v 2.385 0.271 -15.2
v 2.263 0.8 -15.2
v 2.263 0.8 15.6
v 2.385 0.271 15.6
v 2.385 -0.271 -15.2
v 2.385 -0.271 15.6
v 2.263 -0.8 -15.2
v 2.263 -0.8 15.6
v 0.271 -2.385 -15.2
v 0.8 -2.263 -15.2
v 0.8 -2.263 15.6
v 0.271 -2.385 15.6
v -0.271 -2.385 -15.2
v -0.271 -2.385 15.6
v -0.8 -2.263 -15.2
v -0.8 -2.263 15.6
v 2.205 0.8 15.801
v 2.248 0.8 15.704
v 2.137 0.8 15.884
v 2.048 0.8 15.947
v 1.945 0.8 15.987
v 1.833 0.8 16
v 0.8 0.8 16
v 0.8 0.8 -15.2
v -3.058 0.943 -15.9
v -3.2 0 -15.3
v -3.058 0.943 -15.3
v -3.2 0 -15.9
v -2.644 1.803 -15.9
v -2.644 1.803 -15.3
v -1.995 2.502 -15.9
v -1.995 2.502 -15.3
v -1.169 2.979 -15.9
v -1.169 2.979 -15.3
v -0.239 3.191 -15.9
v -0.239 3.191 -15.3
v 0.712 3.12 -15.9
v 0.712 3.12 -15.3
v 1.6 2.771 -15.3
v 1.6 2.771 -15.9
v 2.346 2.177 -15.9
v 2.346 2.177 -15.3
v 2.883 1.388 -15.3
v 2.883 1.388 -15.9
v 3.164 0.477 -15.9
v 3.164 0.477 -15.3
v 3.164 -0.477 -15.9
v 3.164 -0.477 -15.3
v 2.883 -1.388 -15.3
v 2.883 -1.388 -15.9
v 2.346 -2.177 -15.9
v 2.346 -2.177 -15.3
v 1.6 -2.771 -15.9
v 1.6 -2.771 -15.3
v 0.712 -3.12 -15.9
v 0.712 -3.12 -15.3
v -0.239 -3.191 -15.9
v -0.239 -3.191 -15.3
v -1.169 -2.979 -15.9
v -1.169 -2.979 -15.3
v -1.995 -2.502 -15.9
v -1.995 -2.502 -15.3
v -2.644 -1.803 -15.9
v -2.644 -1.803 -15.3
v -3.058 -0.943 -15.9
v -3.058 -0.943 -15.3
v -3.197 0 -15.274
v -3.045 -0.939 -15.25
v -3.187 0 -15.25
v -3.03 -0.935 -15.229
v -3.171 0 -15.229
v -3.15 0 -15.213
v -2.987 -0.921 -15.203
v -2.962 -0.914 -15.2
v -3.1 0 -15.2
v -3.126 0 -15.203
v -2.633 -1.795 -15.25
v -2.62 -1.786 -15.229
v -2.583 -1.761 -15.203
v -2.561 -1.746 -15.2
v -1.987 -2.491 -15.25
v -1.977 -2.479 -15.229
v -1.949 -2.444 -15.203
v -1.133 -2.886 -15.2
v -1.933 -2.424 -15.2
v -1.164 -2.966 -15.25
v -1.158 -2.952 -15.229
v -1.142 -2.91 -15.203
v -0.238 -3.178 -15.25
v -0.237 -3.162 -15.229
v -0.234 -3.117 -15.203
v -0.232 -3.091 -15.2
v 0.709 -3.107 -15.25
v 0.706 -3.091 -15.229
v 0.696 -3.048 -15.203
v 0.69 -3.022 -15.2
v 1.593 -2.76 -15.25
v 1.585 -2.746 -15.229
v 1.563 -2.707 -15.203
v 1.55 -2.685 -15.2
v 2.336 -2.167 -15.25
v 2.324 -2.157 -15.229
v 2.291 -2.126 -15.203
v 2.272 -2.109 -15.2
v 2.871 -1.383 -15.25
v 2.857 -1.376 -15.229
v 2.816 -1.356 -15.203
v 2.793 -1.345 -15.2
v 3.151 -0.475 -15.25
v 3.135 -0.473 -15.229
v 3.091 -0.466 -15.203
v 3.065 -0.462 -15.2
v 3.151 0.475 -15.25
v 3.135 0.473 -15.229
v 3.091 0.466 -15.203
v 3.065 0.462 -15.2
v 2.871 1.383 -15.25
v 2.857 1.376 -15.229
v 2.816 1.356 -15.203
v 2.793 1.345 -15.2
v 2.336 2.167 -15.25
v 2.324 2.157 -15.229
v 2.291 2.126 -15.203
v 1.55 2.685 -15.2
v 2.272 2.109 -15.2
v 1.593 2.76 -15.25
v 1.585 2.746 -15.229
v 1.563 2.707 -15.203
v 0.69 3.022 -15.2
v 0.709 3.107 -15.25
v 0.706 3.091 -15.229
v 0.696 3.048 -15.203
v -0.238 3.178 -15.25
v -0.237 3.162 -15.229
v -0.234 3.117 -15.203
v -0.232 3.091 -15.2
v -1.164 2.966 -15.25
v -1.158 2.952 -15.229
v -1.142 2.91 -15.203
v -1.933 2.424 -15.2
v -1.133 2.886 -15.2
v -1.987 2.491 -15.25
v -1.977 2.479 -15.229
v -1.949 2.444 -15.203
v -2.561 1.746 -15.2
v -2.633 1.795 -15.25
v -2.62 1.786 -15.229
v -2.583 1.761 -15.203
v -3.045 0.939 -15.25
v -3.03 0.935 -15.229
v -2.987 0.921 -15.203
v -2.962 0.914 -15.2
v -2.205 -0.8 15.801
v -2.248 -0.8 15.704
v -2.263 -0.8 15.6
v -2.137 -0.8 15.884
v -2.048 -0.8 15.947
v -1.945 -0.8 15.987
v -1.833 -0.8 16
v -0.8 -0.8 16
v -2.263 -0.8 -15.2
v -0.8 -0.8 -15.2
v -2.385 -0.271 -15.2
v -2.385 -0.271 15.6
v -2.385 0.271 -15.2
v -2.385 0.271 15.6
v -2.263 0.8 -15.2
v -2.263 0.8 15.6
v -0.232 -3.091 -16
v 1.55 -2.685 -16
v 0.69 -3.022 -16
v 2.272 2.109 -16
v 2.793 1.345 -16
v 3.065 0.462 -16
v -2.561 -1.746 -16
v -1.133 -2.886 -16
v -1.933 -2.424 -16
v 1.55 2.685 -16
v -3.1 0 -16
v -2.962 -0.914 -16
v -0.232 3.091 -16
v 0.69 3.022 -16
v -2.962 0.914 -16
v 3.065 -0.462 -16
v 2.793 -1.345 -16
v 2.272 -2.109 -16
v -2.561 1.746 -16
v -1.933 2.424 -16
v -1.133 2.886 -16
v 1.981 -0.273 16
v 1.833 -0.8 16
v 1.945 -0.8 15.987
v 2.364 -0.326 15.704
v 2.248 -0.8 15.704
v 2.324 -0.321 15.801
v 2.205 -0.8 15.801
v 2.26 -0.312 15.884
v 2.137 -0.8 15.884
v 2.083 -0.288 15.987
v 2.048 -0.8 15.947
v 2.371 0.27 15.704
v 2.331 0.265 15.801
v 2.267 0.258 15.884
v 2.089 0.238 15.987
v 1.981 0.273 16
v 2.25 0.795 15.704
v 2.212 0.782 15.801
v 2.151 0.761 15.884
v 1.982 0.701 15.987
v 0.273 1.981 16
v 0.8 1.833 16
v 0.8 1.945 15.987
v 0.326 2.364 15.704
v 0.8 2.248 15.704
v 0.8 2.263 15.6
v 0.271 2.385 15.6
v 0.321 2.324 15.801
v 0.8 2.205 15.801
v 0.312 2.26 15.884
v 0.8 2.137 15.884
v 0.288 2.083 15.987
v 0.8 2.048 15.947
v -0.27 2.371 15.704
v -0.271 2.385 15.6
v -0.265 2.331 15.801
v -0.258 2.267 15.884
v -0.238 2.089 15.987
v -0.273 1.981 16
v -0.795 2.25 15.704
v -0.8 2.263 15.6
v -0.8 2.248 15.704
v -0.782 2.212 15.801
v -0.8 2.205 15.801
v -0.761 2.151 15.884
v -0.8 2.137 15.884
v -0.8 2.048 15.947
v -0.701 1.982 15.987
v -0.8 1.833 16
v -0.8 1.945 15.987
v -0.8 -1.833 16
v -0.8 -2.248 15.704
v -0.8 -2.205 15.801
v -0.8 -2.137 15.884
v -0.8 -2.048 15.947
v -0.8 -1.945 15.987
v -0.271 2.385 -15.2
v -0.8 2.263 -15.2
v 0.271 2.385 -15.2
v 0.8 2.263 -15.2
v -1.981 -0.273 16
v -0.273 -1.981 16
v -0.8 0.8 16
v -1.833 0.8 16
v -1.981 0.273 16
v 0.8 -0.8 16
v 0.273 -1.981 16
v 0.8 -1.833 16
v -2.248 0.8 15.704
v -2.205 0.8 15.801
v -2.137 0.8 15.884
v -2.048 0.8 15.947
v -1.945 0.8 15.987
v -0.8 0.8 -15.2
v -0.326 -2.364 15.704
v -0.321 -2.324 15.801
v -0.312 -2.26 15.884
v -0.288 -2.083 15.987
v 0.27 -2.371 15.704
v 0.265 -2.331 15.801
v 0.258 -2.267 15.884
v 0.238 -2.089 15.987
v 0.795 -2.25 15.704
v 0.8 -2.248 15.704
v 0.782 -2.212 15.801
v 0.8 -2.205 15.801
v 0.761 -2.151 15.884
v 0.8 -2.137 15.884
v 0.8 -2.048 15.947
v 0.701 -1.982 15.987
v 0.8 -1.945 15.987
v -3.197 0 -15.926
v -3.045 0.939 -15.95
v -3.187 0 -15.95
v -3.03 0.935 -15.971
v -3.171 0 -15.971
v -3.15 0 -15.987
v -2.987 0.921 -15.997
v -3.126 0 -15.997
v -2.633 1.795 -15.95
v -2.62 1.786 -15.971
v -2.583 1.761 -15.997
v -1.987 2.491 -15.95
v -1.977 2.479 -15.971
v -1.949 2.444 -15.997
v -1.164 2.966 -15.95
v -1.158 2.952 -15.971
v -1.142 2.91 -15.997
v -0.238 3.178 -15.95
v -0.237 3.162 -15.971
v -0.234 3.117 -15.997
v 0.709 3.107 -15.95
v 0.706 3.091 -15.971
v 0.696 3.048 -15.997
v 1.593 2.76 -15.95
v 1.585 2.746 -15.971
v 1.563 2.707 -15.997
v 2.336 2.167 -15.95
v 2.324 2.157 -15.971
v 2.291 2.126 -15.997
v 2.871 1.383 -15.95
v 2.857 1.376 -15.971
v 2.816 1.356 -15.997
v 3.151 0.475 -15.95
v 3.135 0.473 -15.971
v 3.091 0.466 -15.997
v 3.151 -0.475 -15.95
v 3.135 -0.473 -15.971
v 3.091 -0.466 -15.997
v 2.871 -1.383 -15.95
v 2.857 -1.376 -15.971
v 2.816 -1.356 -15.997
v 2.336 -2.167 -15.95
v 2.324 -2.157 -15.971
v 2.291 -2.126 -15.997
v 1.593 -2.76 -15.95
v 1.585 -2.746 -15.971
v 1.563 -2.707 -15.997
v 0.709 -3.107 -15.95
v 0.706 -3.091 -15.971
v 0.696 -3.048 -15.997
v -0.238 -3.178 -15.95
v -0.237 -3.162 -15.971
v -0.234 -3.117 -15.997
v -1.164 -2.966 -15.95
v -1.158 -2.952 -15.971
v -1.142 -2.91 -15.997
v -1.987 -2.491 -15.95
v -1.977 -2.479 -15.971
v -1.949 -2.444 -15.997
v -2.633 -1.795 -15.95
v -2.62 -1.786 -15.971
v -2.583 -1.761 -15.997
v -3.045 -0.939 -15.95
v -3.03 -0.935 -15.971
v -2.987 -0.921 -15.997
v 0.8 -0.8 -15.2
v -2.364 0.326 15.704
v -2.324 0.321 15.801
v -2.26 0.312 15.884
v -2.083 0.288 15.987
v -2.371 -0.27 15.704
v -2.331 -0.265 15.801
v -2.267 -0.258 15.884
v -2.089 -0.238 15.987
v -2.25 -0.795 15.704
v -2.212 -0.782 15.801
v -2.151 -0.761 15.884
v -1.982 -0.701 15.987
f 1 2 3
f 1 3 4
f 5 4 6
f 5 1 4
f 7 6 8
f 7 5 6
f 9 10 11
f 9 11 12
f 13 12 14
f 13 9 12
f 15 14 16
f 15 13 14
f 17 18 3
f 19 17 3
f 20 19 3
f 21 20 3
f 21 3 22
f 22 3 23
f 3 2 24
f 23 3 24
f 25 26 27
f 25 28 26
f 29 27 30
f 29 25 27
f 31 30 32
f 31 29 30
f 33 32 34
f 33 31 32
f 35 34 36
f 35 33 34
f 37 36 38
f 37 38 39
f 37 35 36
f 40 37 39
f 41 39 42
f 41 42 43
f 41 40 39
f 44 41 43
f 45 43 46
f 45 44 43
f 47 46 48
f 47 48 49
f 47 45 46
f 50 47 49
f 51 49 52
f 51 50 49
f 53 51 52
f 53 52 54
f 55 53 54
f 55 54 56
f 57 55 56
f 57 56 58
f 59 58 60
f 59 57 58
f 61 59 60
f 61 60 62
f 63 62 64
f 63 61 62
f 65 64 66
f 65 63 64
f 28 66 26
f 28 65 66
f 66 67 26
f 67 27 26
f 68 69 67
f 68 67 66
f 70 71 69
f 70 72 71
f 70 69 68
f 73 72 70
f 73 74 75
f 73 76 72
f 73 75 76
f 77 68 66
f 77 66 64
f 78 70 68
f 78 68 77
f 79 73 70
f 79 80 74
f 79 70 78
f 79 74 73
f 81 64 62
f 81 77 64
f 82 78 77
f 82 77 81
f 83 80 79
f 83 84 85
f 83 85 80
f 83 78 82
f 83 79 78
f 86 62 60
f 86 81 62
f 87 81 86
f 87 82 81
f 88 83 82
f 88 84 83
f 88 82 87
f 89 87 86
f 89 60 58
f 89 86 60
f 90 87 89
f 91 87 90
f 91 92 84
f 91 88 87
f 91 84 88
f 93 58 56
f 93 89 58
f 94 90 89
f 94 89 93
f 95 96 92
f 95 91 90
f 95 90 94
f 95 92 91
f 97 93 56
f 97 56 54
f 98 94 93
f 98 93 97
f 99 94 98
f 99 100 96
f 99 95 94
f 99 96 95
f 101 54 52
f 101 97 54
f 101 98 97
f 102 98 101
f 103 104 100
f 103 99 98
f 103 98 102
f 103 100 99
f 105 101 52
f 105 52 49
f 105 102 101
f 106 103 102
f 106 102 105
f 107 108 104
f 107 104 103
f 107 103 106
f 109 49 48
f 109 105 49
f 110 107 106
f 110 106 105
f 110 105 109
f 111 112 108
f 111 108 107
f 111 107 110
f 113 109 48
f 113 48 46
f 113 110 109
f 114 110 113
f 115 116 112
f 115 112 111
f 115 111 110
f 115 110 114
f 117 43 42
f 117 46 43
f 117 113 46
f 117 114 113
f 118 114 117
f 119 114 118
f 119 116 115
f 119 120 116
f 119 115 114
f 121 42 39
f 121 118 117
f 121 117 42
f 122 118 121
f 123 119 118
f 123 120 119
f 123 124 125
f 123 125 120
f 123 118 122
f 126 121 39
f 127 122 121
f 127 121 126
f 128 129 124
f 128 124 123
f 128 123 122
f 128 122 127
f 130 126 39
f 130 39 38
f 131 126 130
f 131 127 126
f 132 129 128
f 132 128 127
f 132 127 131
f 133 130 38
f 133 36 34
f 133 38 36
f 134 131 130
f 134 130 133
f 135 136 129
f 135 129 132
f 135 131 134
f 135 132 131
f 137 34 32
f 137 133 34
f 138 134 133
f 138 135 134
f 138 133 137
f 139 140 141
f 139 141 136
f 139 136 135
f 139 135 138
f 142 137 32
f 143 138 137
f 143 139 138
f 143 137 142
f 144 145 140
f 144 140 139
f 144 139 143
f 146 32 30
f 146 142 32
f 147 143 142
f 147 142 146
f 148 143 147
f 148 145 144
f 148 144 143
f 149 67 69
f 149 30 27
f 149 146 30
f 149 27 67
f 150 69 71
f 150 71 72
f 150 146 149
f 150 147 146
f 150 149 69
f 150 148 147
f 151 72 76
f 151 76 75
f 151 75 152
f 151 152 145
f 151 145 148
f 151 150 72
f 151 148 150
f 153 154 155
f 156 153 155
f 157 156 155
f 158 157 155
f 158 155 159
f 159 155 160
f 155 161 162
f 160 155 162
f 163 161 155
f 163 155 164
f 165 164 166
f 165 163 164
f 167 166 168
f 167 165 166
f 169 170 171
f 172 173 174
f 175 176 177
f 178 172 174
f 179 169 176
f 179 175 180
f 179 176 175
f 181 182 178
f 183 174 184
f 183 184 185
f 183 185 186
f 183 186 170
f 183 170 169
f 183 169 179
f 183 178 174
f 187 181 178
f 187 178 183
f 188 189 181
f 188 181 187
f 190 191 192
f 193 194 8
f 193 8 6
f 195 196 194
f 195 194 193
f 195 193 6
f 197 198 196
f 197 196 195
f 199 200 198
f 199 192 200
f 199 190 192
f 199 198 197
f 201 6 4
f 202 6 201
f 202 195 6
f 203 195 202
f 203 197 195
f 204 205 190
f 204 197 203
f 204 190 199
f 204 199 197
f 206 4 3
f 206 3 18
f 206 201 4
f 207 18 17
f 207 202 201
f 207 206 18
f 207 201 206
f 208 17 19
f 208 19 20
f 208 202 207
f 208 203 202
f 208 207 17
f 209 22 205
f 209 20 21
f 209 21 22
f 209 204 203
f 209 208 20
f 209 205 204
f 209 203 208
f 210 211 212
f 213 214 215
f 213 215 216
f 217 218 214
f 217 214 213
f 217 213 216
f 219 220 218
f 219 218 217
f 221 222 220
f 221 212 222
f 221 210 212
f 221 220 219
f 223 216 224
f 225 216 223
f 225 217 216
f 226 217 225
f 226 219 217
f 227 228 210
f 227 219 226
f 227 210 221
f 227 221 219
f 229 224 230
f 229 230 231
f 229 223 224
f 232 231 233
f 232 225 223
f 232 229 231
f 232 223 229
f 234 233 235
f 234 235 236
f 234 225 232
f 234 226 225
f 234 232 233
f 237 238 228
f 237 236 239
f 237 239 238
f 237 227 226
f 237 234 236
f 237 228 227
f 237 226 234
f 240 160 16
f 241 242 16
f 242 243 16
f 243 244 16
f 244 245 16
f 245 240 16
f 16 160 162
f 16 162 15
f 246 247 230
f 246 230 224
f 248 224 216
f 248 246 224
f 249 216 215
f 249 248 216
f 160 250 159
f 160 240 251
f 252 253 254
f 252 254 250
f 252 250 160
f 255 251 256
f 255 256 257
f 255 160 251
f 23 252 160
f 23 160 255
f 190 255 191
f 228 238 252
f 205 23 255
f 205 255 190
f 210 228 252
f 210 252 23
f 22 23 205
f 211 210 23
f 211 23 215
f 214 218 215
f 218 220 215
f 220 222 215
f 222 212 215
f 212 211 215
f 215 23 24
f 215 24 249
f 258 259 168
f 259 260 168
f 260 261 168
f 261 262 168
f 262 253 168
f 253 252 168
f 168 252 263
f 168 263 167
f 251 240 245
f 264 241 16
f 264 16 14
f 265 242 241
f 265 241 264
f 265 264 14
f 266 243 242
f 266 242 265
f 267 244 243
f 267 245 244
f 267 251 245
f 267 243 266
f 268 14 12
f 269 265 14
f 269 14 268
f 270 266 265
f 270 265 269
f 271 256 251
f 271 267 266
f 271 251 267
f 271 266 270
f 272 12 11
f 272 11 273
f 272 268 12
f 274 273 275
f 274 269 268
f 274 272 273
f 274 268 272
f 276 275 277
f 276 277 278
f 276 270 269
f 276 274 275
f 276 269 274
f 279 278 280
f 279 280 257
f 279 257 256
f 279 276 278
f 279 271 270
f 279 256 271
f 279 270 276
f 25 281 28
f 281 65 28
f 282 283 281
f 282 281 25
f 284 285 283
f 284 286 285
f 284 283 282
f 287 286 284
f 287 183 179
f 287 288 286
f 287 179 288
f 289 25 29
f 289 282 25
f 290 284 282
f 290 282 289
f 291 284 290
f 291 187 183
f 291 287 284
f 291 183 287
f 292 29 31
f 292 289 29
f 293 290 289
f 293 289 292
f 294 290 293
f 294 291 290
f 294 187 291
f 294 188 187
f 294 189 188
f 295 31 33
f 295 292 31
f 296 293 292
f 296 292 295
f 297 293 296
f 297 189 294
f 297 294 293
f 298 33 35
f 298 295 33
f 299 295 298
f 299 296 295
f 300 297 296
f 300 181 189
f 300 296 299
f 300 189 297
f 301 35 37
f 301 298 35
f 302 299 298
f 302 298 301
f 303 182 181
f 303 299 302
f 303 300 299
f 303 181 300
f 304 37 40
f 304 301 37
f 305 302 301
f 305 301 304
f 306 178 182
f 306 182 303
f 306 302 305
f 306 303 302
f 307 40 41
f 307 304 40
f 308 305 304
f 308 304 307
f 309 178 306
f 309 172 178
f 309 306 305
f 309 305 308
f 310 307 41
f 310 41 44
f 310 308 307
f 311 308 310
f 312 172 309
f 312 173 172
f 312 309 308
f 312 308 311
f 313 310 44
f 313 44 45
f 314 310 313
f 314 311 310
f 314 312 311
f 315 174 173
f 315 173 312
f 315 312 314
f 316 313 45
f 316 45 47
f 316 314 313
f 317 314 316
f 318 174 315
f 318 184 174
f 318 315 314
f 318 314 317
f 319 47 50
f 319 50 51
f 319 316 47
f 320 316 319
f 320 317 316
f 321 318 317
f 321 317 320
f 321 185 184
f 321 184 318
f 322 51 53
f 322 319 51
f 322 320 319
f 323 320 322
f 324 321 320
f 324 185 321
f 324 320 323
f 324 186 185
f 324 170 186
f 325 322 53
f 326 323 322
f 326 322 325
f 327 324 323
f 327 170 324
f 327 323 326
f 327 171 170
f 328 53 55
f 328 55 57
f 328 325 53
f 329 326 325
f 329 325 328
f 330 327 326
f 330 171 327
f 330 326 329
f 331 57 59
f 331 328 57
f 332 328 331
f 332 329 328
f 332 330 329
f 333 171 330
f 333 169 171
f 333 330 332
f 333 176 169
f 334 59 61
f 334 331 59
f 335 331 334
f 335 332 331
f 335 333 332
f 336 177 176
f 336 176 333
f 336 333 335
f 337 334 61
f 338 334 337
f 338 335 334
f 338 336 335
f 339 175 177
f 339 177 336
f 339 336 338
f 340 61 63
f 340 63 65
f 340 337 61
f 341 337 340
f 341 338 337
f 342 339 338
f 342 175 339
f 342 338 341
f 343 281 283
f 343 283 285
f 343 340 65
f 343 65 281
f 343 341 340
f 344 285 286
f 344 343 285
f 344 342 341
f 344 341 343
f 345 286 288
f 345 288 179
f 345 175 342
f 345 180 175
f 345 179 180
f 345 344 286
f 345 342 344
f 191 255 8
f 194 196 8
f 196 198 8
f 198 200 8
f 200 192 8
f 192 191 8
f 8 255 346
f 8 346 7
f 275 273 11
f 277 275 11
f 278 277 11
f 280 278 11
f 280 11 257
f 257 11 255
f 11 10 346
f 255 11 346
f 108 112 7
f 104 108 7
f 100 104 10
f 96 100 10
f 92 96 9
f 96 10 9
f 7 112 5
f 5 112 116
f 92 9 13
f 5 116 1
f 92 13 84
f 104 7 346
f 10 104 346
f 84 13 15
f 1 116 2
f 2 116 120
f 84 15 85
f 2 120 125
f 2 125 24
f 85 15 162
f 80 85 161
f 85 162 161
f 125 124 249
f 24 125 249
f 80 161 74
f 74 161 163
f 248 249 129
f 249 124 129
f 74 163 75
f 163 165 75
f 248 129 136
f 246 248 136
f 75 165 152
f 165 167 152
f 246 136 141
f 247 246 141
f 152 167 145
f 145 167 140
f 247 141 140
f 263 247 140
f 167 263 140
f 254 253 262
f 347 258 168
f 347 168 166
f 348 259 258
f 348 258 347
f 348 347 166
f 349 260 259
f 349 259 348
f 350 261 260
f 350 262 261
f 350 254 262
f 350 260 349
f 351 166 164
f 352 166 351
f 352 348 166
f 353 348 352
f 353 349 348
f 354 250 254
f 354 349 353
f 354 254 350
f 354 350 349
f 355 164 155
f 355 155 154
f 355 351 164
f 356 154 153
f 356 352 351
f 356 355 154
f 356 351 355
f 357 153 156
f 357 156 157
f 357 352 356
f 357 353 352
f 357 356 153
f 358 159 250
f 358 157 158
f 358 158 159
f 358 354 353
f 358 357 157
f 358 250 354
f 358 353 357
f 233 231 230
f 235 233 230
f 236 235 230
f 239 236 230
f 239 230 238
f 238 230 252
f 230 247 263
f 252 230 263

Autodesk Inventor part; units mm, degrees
ref_plane "YZ Plane" through (0, 0, 0) normal (1, 0, 0) x (0, 1, 0)
ref_plane "XZ Plane" through (0, 0, 0) normal (0, 1, 0) x (-1, 0, 0)
ref_plane "XY Plane" through (0, 0, 0) normal (0, 0, 1) x (1, 0, 0)
sketch "Sketch1" plane through (0, 0, 0) normal (0, 0, 1) x (1, 0, 0)
  circle A0 centre (0, 0) radius 2.4 construction
  line L0 (-0.8, 2.2627) -> (-0.8, 0.8)
  line L1 (-0.8, 0.8) -> (-2.2627, 0.8)
  line L2 (-2.2627, -0.8) -> (-0.8, -0.8)
  line L3 (-0.8, -0.8) -> (-0.8, -2.2627)
  line L4 (0.8, -2.2627) -> (0.8, -0.8)
  line L5 (0.8, -0.8) -> (2.2627, -0.8)
  line L6 (2.2627, 0.8) -> (0.8, 0.8)
  line L7 (0.8, 0.8) -> (0.8, 2.2627)
  arc A1 (0.8, 2.2627) -> (-0.8, 2.2627) centre (0, 0) ccw
  arc A2 (-2.2627, 0.8) -> (-2.2627, -0.8) centre (0, 0) ccw
  arc A3 (-0.8, -2.2627) -> (0.8, -2.2627) centre (0, 0) ccw
  arc A4 (2.2627, -0.8) -> (2.2627, 0.8) centre (0, 0) ccw
  dimension "d0" = 4.8
  dimension "d1" = 1.6
extrude "Extrusion1" add sketch "Sketch1" along normal mid plane 32
sketch "Sketch2" plane through (0, 0, -16) normal (0, 0, -1) x (-1, 0, 0)
  line L0 (0.8, 0.8) -> (0.8, 2.2627) projected
  arc A0 (0.8, 2.2627) -> (-0.8, 2.2627) centre (0, 0) ccw projected
  line L1 (-0.8, 2.2627) -> (-0.8, 0.8) projected
  line L2 (-0.8, 0.8) -> (-2.2627, 0.8) projected
  arc A1 (-2.2627, 0.8) -> (-2.2627, -0.8) centre (0, 0) ccw projected
  line L3 (-2.2627, -0.8) -> (-0.8, -0.8) projected
  line L4 (-0.8, -0.8) -> (-0.8, -2.2627) projected
  arc A2 (-0.8, -2.2627) -> (0.8, -2.2627) centre (0, 0) ccw projected
  line L5 (0.8, -2.2627) -> (0.8, -0.8) projected
  line L6 (0.8, -0.8) -> (2.2627, -0.8) projected
  arc A3 (2.2627, -0.8) -> (2.2627, 0.8) centre (0, 0) ccw projected
  line L7 (2.2627, 0.8) -> (0.8, 0.8) projected
  circle A4 centre (0, 0) radius 3.2
  dimension "d7" = 6.4
extrude "Extrusion2" add sketch "Sketch2" against normal blind 0.8
fillet "Fillet1" radius 0.4 4 edges at (0, 2.4, 16) (-2.4, 0, 16) (0, -2.4, 16) (2.4, 0, 16)
fillet "Fillet1" radius 0.1 2 edges at (3.2, 0, -15.2) (3.2, 0, -16)
equation "\"d0\" = kd"
equation "\"d1\" = axlet"
equation "\"d2\" = 4 * lu"
equation "\"d7\" = tsd"
equation "\"d8\" = tsl"
equation "\"d4\" = tf"
equation "\"d10\" = lf"
equation "\"kd\" = 4.8"
equation "\"axlet\" = 1.6"
equation "\"lu\" = 8"
equation "\"tsd\" = 6.4"
equation "\"tsl\" = 0.8"
equation "\"tf\" = 0.4"
equation "\"lf\" = 0.1"
properties part number "87083-DkBluishGray" material "ABS Plastic"
